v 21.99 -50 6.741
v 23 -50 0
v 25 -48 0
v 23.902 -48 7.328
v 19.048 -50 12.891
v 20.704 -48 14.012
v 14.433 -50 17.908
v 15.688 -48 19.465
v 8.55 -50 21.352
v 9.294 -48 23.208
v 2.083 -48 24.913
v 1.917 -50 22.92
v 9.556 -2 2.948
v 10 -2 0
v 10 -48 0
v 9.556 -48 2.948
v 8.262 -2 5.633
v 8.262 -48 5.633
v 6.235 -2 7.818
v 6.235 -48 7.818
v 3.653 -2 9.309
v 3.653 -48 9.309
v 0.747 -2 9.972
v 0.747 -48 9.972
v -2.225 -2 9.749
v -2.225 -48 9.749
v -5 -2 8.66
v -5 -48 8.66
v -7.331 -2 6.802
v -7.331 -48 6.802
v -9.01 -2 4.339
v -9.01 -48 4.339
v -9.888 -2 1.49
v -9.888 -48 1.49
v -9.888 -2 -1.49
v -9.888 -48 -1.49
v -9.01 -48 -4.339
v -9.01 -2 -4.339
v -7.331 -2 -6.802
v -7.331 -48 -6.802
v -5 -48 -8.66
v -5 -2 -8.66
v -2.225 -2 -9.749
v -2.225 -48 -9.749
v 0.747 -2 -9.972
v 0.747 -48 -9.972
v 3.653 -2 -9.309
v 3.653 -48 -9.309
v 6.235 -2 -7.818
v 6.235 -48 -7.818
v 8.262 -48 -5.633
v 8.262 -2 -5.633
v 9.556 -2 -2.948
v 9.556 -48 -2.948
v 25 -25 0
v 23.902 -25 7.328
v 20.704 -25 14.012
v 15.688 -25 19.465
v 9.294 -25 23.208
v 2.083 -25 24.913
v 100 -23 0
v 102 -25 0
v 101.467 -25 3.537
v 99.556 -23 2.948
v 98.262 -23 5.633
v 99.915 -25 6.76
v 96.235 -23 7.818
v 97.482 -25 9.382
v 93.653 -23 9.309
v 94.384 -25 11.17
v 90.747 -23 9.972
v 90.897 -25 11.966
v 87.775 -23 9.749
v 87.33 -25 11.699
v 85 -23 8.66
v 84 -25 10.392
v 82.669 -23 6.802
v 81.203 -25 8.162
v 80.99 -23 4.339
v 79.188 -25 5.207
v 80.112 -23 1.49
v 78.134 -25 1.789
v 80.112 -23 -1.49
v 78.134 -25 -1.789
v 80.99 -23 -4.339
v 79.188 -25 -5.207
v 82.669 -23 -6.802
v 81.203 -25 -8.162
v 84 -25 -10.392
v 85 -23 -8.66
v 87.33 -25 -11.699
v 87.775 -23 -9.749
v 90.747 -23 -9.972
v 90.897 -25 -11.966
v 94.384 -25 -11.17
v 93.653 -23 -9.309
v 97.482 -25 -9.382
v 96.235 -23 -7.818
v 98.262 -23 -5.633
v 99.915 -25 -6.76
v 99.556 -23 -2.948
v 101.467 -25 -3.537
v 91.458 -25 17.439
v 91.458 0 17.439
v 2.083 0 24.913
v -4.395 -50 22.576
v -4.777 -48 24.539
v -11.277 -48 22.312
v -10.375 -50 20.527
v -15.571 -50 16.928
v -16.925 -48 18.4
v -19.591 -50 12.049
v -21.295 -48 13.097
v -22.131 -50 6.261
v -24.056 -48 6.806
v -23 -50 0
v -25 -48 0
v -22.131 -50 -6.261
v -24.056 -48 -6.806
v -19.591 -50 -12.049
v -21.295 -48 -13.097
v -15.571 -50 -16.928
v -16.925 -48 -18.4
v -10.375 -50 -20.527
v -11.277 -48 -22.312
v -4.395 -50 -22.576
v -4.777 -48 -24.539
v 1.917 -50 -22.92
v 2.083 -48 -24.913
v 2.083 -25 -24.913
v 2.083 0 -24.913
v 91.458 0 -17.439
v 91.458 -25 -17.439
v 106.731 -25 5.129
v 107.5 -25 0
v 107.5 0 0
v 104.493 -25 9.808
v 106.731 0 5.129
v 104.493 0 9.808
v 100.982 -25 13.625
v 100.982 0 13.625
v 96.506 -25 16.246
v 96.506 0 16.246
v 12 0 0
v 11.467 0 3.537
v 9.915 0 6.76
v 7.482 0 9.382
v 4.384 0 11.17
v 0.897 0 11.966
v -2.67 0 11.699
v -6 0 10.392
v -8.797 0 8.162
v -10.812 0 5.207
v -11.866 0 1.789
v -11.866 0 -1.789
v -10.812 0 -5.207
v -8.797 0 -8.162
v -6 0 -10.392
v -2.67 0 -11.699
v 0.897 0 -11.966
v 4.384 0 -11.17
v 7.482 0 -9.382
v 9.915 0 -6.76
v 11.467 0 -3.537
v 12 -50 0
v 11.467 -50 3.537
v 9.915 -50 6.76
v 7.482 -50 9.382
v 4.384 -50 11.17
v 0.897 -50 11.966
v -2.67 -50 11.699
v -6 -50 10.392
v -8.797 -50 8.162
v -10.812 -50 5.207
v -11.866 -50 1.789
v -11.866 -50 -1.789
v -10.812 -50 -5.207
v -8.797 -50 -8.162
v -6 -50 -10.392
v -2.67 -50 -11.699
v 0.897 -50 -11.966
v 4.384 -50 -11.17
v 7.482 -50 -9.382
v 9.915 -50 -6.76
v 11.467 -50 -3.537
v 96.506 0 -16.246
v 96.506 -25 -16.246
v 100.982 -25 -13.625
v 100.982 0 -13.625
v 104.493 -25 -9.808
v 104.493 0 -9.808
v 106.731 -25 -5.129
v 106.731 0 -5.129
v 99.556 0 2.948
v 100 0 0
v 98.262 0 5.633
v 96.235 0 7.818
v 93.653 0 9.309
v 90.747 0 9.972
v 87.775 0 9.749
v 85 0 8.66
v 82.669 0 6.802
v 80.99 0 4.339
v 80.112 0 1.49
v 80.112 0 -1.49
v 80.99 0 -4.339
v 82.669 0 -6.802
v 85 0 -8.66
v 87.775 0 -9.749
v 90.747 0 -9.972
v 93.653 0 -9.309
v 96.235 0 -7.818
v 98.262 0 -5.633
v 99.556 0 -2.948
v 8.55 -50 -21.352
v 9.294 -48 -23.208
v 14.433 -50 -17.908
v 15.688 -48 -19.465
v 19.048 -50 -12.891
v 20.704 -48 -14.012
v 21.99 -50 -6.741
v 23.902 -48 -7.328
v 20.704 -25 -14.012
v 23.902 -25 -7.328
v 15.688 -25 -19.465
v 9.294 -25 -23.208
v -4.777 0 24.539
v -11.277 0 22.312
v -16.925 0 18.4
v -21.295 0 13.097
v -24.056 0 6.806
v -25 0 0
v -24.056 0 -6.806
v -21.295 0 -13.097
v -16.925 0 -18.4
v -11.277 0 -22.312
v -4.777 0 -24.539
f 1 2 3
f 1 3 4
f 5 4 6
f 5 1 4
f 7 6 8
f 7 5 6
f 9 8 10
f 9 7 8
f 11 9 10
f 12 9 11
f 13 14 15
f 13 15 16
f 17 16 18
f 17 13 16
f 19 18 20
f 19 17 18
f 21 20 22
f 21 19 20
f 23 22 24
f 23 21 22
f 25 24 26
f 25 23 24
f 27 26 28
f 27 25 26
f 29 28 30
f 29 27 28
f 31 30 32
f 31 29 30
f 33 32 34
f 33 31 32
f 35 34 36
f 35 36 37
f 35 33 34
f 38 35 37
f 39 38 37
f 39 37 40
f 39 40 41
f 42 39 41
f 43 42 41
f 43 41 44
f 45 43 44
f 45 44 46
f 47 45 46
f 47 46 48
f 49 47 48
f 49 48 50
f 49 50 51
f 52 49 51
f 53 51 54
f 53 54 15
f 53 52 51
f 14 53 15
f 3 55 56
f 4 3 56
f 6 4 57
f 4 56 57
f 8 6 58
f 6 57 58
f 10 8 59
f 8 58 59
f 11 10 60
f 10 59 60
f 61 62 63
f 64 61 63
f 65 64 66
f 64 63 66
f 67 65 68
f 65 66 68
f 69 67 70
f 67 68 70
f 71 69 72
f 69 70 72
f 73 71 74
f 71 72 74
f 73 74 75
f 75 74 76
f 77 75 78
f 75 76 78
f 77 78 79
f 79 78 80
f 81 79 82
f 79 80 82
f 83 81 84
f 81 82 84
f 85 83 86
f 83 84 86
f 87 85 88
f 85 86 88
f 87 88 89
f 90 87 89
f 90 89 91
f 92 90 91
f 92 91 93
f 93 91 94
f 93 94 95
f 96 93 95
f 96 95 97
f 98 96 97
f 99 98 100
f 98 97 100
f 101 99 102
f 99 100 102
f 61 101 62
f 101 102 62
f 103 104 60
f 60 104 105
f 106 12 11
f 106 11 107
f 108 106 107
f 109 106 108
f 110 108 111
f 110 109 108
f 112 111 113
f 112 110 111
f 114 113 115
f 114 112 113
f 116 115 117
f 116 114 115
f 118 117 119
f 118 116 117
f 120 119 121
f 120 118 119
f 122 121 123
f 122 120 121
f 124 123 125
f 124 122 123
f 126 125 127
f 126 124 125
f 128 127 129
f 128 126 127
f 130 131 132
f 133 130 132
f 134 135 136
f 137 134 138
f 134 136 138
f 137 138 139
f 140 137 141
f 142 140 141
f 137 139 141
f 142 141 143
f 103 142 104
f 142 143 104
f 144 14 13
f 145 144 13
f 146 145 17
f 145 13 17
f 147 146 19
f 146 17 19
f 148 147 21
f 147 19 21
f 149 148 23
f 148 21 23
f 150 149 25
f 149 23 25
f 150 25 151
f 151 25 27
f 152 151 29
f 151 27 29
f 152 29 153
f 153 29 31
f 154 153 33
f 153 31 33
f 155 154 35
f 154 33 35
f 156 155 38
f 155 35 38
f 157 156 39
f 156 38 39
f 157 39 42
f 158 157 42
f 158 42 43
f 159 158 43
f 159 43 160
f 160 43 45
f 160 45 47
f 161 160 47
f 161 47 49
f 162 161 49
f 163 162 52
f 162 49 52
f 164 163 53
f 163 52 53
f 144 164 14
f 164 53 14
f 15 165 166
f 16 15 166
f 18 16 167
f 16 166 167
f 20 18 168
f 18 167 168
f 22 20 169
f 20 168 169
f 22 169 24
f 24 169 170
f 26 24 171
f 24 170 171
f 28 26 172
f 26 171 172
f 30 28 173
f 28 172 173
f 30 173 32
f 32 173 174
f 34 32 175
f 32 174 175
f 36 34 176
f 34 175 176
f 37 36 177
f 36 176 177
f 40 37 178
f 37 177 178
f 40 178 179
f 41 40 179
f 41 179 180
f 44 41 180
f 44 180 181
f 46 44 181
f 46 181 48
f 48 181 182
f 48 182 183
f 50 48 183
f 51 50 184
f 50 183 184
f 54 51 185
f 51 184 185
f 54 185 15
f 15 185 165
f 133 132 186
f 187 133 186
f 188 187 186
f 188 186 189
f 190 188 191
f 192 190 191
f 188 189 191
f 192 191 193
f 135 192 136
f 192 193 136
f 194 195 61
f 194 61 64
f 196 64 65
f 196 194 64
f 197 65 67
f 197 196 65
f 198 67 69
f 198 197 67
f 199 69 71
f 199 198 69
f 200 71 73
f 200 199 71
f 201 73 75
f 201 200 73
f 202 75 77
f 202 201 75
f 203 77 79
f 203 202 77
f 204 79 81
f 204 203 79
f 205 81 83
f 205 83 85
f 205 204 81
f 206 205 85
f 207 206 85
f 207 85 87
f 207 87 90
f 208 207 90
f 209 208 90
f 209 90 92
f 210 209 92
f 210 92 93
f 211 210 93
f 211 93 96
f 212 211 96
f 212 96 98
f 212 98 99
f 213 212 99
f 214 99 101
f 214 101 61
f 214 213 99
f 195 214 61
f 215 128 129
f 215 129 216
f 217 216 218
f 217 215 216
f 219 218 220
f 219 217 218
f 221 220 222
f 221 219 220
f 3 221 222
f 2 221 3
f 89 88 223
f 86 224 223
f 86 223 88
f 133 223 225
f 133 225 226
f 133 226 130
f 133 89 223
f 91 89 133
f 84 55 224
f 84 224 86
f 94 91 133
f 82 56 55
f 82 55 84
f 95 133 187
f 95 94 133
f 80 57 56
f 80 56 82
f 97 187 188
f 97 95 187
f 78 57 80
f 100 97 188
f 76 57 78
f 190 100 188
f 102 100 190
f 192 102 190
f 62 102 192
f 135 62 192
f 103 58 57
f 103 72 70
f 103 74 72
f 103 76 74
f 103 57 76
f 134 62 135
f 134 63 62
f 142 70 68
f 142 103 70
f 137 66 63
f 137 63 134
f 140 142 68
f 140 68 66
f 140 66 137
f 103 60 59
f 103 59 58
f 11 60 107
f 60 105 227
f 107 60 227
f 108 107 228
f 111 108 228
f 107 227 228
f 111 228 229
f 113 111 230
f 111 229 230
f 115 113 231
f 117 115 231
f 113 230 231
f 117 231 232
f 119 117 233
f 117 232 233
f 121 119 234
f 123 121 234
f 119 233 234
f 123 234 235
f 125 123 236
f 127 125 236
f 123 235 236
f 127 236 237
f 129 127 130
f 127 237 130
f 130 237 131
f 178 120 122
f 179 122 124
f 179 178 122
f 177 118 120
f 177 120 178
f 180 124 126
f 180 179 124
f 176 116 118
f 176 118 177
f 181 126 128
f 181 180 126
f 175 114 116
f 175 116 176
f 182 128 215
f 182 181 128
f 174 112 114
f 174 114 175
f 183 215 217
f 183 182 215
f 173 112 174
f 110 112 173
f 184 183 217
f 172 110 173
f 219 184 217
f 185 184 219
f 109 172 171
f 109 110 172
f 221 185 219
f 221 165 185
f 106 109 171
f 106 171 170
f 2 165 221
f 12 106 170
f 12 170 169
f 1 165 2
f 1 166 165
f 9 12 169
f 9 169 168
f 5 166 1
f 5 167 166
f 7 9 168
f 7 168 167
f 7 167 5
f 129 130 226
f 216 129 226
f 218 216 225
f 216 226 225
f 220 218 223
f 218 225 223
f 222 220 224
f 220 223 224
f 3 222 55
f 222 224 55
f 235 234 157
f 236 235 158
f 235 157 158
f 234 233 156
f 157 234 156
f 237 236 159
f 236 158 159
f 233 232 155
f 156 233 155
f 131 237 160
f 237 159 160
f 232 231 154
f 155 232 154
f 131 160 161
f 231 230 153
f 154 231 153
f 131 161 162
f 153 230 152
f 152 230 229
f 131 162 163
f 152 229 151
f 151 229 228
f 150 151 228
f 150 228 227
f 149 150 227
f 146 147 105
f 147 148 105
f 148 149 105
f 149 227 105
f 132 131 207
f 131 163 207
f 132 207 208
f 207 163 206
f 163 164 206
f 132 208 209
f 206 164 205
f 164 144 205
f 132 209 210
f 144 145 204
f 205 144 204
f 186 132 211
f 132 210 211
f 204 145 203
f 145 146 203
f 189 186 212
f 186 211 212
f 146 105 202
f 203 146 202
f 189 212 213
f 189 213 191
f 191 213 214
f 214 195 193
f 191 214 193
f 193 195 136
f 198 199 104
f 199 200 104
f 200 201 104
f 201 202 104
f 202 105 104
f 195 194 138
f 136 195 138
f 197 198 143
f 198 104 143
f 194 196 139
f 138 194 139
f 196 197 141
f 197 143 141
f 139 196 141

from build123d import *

# Parameters (mm, degrees)
F0_R     = 10
F1_DEPTH = 25
F2_DEPTH = 50
F3_SIZE  = 2


with BuildPart() as f1:
    # F0 (on Front) → F1 (new body)
    with BuildSketch(Plane.XZ):
        with BuildLine():
            ThreePointArc((2.083333, -24.913043), (18.399502, -16.92508), (25, 0))
            ThreePointArc((25, 0), (18.399502, 16.92508), (2.083333, 24.913043))
            ThreePointArc((2.083333, 24.913043), (-25, 0), (2.083333, -24.913043))
        make_face()
        Circle(F0_R, mode=Mode.SUBTRACT)
        with BuildLine():
            ThreePointArc((2.083333, 24.913043), (18.399502, 16.92508), (25, 0))
            ThreePointArc((25, 0), (18.399502, -16.92508), (2.083333, -24.913043))
            Line((2.083333, -24.913043), (91.458333, -17.43913))
            ThreePointArc((91.458333, -17.43913), (72.5, 0), (91.458333, 17.43913))
            Line((91.458333, 17.43913), (2.083333, 24.913043))
        make_face()
        with BuildLine():
            ThreePointArc((107.5, 0), (102.879651, 11.847556), (91.458333, 17.43913))
            ThreePointArc((91.458333, 17.43913), (72.5, 0), (91.458333, -17.43913))
            ThreePointArc((91.458333, -17.43913), (102.879651, -11.847556), (107.5, 0))
        make_face()
        with Locations((90, 0)):
            Circle(F0_R, mode=Mode.SUBTRACT)
    extrude(amount=F1_DEPTH)

    # F0 (on Front) → F2 (join)
    with BuildSketch(Plane.XZ):
        with BuildLine():
            ThreePointArc((2.083333, -24.913043), (18.399502, -16.92508), (25, 0))
            ThreePointArc((25, 0), (18.399502, 16.92508), (2.083333, 24.913043))
            ThreePointArc((2.083333, 24.913043), (-25, 0), (2.083333, -24.913043))
        make_face()
        Circle(F0_R, mode=Mode.SUBTRACT)
    extrude(amount=F2_DEPTH)

    # F3
    f3_edges = [f1.edges().sort_by_distance(p)[0] for p in [
        (-2.083333, -50, 24.913043),
        (-10, -50, 0),
        (-10, 0, 0),
        (10, -25, 0),
        (80, -25, 0),
    ]]
    chamfer(f3_edges, length=F3_SIZE)


solid = f1.part
